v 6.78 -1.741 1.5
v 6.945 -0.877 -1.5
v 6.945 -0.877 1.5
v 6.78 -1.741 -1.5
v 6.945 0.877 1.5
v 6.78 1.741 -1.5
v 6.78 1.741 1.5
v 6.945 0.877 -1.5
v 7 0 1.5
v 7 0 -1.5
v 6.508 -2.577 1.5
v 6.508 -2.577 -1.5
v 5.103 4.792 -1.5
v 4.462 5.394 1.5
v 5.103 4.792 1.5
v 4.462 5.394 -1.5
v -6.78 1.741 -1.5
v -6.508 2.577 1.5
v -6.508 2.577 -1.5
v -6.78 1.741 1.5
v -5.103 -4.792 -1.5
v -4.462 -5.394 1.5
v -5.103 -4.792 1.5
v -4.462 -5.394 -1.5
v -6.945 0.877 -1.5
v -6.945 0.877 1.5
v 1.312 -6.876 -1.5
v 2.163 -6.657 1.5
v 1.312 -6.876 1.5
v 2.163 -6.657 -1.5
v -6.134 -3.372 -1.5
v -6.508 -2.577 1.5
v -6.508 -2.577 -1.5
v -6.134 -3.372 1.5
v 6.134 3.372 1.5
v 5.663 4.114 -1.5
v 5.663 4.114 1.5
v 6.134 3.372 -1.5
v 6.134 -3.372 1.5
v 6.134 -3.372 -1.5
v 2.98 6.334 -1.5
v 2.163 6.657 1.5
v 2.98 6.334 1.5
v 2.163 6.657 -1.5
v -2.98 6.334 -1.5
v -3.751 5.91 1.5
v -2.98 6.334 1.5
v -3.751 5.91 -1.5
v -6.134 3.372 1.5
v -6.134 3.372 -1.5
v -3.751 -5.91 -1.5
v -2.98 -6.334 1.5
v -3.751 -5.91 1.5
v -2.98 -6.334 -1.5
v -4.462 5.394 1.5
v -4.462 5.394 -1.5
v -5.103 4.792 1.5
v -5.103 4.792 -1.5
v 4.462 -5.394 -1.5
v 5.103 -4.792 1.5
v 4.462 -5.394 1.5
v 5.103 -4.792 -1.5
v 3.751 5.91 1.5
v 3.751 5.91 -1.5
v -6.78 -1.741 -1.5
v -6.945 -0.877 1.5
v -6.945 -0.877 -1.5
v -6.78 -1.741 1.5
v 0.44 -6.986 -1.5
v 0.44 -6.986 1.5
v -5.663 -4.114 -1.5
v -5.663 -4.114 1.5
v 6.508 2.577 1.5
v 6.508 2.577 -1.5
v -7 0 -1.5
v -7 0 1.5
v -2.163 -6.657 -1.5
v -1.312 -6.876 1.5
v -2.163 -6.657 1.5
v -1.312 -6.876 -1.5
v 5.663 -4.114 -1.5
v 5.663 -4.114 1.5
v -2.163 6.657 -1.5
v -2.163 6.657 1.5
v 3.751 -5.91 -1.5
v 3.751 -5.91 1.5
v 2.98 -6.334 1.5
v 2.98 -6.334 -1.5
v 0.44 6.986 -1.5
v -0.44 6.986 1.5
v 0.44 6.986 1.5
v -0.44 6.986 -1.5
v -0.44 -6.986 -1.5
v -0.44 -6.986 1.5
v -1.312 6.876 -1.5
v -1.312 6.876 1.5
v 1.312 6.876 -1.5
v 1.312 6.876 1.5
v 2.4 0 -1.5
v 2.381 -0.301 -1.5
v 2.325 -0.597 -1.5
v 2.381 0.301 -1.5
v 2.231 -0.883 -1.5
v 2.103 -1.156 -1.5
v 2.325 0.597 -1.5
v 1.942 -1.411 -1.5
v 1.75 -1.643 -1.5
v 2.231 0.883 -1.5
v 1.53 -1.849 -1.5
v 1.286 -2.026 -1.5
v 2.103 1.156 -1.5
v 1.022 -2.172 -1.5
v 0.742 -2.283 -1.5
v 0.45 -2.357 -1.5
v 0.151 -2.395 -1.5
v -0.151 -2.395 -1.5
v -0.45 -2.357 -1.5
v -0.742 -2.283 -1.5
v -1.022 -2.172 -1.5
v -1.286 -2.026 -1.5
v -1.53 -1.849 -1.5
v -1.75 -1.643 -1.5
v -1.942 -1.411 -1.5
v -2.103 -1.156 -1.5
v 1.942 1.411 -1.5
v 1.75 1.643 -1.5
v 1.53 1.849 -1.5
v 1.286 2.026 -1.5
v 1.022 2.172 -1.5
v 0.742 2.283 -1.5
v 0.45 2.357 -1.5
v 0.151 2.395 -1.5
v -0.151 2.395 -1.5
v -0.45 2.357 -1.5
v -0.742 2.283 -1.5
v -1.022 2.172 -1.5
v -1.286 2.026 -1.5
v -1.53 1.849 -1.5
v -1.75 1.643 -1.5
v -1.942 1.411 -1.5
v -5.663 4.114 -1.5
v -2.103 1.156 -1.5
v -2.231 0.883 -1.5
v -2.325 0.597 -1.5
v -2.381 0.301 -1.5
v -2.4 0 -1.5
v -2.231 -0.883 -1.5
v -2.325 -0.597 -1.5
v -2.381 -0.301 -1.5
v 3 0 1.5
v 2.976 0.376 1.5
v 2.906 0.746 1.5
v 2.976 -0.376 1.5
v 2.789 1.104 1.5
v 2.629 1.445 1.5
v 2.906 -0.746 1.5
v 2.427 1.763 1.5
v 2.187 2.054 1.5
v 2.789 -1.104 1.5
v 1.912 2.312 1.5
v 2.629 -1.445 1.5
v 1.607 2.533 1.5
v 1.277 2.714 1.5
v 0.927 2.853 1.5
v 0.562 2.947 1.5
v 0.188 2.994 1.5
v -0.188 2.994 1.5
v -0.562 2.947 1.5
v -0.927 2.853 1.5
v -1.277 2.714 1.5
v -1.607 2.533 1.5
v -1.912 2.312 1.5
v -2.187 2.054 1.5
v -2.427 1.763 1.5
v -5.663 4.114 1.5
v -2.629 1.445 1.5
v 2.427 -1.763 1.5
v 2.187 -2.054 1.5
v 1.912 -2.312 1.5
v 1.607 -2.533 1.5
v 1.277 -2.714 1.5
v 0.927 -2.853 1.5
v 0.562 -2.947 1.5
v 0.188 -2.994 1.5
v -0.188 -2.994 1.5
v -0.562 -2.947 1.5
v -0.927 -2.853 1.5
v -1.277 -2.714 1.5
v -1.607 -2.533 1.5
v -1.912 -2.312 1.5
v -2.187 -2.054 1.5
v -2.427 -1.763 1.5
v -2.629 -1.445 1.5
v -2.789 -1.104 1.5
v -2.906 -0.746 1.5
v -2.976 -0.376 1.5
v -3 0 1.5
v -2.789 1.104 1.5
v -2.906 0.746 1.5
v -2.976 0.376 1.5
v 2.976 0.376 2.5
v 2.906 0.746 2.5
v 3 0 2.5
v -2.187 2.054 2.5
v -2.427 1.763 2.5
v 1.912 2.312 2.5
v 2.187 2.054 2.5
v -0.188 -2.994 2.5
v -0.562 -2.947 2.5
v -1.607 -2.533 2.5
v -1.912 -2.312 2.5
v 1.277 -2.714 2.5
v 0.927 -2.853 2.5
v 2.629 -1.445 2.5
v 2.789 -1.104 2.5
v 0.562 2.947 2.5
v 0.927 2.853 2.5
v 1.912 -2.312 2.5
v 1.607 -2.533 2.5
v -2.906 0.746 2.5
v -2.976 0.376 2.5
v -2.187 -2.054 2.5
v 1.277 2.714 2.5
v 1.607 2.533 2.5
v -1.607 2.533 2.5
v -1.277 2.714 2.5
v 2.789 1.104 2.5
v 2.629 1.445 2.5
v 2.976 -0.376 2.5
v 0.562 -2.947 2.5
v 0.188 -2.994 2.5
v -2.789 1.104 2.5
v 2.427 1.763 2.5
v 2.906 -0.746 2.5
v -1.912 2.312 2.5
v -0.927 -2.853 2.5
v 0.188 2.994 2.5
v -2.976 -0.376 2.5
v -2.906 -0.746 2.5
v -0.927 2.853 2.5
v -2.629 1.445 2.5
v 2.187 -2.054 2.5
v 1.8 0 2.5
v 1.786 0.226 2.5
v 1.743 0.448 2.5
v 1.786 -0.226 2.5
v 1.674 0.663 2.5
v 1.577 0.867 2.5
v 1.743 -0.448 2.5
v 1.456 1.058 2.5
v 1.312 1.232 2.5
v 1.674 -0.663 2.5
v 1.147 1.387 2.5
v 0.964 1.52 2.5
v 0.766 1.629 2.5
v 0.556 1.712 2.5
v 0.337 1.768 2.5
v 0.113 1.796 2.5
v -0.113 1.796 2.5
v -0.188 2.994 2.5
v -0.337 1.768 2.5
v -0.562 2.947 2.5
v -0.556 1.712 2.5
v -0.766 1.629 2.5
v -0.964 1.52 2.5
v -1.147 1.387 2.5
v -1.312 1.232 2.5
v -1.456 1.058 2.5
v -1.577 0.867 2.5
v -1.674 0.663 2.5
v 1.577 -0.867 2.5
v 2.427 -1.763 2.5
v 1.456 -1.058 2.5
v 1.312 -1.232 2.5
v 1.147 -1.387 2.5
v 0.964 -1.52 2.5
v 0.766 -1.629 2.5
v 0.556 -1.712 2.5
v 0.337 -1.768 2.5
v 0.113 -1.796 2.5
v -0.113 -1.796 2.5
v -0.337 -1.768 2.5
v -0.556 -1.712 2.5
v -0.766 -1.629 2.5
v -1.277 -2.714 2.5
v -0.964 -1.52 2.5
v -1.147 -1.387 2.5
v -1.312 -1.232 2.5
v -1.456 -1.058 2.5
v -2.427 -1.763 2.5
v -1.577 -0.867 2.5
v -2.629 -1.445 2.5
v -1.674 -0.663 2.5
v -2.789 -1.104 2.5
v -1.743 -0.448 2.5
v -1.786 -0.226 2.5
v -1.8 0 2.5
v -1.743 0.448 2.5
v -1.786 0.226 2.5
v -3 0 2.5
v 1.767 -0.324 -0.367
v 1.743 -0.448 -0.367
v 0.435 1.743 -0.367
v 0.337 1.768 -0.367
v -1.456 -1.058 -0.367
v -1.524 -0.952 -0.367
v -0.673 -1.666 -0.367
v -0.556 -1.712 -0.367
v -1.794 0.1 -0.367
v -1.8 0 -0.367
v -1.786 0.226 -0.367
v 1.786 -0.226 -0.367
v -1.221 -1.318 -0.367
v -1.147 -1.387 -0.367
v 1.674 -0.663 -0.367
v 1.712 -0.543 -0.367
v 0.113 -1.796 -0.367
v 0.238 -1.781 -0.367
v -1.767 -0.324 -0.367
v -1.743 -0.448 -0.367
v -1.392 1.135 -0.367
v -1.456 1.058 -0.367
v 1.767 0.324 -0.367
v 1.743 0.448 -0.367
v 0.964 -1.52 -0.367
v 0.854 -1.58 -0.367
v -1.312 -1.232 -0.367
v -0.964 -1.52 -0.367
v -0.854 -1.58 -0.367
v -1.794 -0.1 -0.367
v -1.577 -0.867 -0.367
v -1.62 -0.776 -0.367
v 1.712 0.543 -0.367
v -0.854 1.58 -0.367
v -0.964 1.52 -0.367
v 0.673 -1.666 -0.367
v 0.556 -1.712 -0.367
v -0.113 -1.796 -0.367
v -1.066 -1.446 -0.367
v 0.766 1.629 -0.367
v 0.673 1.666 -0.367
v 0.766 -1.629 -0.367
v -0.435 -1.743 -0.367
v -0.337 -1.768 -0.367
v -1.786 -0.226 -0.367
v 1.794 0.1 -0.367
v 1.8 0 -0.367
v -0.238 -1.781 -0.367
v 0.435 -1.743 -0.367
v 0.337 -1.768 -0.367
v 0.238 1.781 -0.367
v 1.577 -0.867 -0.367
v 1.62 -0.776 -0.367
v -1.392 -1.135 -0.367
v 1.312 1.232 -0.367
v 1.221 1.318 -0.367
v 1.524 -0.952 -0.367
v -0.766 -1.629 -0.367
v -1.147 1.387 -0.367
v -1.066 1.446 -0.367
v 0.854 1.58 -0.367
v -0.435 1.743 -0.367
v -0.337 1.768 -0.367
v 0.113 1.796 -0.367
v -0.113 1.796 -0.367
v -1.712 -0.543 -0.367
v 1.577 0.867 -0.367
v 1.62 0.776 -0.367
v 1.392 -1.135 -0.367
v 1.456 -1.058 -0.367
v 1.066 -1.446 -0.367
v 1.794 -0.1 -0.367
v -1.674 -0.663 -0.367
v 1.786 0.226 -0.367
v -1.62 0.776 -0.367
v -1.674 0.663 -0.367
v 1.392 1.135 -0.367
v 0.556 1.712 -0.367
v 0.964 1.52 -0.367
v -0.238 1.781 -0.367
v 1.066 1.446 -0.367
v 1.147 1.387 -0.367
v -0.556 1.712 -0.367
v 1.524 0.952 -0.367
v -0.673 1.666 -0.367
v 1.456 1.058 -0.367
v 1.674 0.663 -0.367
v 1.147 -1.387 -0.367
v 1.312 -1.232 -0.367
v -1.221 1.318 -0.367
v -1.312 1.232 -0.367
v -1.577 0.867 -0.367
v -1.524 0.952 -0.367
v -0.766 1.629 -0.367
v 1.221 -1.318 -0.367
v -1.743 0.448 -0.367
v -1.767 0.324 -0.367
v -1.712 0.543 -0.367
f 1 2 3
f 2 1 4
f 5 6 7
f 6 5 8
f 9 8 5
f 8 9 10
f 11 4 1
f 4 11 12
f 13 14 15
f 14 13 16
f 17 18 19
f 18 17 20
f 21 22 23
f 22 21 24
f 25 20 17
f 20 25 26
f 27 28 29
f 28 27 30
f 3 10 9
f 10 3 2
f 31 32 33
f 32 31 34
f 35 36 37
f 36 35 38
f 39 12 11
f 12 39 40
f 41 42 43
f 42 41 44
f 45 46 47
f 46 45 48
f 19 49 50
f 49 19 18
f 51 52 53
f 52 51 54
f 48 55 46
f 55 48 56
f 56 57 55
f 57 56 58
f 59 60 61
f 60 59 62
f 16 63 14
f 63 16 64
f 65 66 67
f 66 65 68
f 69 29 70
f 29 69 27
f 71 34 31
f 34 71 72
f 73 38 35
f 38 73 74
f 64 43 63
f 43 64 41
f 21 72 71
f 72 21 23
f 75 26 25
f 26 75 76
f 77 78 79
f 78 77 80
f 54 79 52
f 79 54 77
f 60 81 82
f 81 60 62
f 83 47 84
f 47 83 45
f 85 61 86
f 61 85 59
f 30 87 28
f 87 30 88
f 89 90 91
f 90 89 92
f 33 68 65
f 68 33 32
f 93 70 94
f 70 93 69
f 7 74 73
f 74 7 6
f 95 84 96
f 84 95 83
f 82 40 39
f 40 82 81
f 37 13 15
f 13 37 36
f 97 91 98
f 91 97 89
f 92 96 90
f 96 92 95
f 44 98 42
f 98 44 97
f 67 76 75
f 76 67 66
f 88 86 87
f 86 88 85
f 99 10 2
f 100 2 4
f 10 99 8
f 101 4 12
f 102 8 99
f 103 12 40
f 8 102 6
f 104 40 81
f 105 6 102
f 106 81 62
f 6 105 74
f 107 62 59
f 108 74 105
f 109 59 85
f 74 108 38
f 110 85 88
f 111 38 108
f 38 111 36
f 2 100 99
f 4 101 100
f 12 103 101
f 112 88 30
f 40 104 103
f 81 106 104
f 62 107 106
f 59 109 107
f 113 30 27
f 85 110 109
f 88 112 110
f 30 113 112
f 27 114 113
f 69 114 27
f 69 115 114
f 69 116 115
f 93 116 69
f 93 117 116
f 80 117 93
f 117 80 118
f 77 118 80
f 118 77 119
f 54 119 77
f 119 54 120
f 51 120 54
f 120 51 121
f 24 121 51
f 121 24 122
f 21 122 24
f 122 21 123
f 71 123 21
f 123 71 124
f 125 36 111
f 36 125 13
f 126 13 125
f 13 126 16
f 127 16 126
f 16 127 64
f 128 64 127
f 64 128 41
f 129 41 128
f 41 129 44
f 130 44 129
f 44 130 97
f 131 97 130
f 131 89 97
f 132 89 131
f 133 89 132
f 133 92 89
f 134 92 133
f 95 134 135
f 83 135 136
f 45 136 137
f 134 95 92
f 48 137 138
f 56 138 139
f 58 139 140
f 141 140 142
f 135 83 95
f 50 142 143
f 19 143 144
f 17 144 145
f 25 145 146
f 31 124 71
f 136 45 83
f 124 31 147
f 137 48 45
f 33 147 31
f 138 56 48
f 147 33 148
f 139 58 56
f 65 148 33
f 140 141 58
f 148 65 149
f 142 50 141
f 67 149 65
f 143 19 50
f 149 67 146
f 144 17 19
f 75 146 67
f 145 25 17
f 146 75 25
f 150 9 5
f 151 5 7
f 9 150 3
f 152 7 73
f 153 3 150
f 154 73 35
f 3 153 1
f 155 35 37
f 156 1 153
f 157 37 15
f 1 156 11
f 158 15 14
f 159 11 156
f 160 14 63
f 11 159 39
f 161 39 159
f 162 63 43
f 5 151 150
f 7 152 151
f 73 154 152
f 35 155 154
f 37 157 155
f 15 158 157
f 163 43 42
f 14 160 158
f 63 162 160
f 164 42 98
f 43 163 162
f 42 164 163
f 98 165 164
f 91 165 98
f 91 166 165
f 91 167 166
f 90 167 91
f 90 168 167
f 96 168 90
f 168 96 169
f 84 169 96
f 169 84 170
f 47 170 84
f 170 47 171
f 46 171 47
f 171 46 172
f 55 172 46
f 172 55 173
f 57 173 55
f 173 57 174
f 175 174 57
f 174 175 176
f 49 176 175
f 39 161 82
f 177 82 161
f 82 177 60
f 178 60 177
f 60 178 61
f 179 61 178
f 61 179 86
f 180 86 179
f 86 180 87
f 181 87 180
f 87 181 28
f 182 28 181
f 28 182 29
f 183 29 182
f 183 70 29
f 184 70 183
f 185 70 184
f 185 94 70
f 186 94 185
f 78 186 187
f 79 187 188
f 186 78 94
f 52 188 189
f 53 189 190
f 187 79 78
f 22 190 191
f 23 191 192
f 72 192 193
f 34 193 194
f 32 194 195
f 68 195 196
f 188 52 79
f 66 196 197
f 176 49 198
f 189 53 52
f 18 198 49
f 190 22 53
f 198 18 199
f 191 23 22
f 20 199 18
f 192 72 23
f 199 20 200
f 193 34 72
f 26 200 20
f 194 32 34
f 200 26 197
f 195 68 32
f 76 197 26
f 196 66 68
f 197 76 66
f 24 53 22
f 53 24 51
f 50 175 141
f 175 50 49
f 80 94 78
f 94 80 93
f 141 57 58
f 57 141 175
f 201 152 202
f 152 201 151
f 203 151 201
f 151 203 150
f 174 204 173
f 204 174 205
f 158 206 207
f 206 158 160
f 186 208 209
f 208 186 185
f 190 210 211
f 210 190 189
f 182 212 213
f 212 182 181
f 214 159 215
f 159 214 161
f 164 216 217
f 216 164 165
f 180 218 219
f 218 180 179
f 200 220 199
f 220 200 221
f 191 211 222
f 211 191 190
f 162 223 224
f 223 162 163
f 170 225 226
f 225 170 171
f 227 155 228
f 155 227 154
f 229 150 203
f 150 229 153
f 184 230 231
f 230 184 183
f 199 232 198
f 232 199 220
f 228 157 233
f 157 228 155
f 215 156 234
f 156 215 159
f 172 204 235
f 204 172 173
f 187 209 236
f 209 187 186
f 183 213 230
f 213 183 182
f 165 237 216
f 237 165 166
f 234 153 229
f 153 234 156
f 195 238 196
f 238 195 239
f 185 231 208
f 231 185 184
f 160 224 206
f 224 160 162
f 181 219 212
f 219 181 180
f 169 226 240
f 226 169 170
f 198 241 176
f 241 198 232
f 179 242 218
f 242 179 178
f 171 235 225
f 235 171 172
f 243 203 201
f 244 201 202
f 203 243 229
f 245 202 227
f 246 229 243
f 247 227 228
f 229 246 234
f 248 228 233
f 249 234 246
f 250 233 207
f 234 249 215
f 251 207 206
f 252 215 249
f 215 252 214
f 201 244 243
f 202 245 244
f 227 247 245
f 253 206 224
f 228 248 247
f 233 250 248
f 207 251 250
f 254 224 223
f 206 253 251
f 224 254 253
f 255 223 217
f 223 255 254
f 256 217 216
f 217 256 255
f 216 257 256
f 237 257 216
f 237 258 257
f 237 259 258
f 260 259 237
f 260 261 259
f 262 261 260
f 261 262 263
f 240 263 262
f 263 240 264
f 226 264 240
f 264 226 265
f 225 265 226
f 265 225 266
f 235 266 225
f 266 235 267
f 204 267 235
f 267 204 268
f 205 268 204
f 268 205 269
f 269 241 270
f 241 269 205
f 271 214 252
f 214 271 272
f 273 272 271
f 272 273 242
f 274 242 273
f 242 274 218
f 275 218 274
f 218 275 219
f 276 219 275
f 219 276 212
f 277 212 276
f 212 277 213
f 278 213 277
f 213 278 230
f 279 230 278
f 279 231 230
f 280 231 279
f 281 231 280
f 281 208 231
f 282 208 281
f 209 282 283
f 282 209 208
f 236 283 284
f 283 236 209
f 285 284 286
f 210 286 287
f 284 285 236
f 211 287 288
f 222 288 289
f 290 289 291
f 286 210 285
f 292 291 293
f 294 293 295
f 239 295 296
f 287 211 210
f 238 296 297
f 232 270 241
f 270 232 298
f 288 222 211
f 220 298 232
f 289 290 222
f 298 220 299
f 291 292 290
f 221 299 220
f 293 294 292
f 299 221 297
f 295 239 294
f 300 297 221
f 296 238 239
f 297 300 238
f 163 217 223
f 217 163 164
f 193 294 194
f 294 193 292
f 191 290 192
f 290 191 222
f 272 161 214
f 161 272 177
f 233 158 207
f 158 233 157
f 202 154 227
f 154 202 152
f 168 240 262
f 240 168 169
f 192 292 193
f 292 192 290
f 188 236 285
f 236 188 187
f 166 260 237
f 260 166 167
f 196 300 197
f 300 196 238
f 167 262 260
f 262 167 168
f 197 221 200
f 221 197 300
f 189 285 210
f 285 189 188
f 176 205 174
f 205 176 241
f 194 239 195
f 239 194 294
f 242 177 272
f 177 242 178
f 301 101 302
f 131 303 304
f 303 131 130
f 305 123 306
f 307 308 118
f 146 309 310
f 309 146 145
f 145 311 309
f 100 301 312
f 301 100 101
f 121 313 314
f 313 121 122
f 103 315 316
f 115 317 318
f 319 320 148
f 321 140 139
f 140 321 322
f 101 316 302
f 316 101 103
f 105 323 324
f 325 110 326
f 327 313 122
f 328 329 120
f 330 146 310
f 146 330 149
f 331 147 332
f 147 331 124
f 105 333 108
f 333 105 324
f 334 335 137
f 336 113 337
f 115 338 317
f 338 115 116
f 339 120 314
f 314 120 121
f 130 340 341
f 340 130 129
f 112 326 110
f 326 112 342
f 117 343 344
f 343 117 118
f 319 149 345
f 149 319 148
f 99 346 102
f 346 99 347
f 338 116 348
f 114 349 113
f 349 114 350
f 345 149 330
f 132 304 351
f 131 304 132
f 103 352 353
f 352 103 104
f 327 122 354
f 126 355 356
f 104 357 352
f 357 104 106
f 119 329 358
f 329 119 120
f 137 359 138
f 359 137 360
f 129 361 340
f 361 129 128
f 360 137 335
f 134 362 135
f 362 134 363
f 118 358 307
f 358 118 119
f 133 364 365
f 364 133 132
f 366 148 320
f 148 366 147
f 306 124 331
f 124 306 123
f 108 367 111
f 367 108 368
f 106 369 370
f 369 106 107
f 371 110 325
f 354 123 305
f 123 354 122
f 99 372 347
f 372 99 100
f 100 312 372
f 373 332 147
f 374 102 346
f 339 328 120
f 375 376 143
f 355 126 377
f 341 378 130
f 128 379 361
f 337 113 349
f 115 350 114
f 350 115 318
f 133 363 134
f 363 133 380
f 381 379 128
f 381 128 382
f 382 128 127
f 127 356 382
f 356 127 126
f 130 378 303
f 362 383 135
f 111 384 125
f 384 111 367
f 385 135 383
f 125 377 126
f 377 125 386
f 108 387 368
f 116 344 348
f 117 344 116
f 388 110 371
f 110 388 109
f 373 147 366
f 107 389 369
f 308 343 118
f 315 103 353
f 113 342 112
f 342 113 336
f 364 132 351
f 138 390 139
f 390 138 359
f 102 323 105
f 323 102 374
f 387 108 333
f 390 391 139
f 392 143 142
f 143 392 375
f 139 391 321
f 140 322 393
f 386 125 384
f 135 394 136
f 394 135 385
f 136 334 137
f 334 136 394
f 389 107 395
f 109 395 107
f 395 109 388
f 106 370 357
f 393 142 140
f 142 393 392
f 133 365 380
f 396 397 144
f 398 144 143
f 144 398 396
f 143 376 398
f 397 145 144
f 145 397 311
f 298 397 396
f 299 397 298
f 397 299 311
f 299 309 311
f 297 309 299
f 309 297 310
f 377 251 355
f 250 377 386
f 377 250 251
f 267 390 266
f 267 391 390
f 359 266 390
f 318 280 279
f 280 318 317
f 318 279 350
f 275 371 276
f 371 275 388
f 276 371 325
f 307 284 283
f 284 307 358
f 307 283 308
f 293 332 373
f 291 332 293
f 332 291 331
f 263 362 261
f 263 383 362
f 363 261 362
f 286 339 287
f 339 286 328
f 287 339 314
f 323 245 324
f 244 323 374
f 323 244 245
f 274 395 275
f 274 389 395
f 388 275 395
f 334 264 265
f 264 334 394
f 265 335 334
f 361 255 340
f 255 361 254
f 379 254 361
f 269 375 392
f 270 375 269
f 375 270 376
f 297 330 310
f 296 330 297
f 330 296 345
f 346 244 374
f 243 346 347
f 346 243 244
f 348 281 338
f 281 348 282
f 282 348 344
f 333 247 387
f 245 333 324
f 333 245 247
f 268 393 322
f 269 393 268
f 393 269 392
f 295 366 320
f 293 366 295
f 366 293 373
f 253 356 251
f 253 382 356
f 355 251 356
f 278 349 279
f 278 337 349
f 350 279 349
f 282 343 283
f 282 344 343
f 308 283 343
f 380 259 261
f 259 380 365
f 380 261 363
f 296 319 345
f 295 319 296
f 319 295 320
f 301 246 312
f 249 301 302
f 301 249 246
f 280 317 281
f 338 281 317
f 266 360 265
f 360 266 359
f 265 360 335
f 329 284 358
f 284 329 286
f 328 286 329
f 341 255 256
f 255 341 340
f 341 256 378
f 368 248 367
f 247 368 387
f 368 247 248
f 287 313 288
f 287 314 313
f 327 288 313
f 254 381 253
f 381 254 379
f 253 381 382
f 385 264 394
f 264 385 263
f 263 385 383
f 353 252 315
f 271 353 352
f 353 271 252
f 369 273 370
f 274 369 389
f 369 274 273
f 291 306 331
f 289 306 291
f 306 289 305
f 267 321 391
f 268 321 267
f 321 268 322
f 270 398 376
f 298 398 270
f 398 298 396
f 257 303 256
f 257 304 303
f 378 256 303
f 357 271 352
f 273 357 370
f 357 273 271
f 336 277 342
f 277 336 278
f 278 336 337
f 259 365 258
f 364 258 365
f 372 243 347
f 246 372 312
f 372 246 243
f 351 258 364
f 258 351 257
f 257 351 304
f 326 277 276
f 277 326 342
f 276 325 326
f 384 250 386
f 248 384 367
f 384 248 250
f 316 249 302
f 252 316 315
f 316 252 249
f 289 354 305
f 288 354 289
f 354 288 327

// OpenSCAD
$fn = 50;


difference() {
	union() {
		translate(v = [0, 0, -1.5000000000]) {
			cylinder(h = 3, r = 7.0000000000);
		}
		translate(v = [0, 0, -1.5000000000]) {
			cylinder(h = 4, r = 3.0000000000);
		}
	}
	union() {
		translate(v = [0, 0, -1.5000000000]) {
			rotate(a = [0, 180, 0]) {
				difference() {
					union() {
						translate(v = [0, 0, -1.7000000000]) {
							cylinder(h = 1.7000000000, r1 = 1.5000000000, r2 = 2.4000000000);
						}
						translate(v = [0, 0, -4.0000000000]) {
							cylinder(h = 4, r = 1.5000000000);
						}
						translate(v = [0, 0, -4.0000000000]) {
							cylinder(h = 4, r = 1.8000000000);
						}
						translate(v = [0, 0, -4.0000000000]) {
							cylinder(h = 4, r = 1.5000000000);
						}
					}
					union();
				}
			}
		}
		translate(v = [0, 0, -50.0000000000]) {
			cylinder(h = 100, r = 1.5000000000);
		}
	}
}
